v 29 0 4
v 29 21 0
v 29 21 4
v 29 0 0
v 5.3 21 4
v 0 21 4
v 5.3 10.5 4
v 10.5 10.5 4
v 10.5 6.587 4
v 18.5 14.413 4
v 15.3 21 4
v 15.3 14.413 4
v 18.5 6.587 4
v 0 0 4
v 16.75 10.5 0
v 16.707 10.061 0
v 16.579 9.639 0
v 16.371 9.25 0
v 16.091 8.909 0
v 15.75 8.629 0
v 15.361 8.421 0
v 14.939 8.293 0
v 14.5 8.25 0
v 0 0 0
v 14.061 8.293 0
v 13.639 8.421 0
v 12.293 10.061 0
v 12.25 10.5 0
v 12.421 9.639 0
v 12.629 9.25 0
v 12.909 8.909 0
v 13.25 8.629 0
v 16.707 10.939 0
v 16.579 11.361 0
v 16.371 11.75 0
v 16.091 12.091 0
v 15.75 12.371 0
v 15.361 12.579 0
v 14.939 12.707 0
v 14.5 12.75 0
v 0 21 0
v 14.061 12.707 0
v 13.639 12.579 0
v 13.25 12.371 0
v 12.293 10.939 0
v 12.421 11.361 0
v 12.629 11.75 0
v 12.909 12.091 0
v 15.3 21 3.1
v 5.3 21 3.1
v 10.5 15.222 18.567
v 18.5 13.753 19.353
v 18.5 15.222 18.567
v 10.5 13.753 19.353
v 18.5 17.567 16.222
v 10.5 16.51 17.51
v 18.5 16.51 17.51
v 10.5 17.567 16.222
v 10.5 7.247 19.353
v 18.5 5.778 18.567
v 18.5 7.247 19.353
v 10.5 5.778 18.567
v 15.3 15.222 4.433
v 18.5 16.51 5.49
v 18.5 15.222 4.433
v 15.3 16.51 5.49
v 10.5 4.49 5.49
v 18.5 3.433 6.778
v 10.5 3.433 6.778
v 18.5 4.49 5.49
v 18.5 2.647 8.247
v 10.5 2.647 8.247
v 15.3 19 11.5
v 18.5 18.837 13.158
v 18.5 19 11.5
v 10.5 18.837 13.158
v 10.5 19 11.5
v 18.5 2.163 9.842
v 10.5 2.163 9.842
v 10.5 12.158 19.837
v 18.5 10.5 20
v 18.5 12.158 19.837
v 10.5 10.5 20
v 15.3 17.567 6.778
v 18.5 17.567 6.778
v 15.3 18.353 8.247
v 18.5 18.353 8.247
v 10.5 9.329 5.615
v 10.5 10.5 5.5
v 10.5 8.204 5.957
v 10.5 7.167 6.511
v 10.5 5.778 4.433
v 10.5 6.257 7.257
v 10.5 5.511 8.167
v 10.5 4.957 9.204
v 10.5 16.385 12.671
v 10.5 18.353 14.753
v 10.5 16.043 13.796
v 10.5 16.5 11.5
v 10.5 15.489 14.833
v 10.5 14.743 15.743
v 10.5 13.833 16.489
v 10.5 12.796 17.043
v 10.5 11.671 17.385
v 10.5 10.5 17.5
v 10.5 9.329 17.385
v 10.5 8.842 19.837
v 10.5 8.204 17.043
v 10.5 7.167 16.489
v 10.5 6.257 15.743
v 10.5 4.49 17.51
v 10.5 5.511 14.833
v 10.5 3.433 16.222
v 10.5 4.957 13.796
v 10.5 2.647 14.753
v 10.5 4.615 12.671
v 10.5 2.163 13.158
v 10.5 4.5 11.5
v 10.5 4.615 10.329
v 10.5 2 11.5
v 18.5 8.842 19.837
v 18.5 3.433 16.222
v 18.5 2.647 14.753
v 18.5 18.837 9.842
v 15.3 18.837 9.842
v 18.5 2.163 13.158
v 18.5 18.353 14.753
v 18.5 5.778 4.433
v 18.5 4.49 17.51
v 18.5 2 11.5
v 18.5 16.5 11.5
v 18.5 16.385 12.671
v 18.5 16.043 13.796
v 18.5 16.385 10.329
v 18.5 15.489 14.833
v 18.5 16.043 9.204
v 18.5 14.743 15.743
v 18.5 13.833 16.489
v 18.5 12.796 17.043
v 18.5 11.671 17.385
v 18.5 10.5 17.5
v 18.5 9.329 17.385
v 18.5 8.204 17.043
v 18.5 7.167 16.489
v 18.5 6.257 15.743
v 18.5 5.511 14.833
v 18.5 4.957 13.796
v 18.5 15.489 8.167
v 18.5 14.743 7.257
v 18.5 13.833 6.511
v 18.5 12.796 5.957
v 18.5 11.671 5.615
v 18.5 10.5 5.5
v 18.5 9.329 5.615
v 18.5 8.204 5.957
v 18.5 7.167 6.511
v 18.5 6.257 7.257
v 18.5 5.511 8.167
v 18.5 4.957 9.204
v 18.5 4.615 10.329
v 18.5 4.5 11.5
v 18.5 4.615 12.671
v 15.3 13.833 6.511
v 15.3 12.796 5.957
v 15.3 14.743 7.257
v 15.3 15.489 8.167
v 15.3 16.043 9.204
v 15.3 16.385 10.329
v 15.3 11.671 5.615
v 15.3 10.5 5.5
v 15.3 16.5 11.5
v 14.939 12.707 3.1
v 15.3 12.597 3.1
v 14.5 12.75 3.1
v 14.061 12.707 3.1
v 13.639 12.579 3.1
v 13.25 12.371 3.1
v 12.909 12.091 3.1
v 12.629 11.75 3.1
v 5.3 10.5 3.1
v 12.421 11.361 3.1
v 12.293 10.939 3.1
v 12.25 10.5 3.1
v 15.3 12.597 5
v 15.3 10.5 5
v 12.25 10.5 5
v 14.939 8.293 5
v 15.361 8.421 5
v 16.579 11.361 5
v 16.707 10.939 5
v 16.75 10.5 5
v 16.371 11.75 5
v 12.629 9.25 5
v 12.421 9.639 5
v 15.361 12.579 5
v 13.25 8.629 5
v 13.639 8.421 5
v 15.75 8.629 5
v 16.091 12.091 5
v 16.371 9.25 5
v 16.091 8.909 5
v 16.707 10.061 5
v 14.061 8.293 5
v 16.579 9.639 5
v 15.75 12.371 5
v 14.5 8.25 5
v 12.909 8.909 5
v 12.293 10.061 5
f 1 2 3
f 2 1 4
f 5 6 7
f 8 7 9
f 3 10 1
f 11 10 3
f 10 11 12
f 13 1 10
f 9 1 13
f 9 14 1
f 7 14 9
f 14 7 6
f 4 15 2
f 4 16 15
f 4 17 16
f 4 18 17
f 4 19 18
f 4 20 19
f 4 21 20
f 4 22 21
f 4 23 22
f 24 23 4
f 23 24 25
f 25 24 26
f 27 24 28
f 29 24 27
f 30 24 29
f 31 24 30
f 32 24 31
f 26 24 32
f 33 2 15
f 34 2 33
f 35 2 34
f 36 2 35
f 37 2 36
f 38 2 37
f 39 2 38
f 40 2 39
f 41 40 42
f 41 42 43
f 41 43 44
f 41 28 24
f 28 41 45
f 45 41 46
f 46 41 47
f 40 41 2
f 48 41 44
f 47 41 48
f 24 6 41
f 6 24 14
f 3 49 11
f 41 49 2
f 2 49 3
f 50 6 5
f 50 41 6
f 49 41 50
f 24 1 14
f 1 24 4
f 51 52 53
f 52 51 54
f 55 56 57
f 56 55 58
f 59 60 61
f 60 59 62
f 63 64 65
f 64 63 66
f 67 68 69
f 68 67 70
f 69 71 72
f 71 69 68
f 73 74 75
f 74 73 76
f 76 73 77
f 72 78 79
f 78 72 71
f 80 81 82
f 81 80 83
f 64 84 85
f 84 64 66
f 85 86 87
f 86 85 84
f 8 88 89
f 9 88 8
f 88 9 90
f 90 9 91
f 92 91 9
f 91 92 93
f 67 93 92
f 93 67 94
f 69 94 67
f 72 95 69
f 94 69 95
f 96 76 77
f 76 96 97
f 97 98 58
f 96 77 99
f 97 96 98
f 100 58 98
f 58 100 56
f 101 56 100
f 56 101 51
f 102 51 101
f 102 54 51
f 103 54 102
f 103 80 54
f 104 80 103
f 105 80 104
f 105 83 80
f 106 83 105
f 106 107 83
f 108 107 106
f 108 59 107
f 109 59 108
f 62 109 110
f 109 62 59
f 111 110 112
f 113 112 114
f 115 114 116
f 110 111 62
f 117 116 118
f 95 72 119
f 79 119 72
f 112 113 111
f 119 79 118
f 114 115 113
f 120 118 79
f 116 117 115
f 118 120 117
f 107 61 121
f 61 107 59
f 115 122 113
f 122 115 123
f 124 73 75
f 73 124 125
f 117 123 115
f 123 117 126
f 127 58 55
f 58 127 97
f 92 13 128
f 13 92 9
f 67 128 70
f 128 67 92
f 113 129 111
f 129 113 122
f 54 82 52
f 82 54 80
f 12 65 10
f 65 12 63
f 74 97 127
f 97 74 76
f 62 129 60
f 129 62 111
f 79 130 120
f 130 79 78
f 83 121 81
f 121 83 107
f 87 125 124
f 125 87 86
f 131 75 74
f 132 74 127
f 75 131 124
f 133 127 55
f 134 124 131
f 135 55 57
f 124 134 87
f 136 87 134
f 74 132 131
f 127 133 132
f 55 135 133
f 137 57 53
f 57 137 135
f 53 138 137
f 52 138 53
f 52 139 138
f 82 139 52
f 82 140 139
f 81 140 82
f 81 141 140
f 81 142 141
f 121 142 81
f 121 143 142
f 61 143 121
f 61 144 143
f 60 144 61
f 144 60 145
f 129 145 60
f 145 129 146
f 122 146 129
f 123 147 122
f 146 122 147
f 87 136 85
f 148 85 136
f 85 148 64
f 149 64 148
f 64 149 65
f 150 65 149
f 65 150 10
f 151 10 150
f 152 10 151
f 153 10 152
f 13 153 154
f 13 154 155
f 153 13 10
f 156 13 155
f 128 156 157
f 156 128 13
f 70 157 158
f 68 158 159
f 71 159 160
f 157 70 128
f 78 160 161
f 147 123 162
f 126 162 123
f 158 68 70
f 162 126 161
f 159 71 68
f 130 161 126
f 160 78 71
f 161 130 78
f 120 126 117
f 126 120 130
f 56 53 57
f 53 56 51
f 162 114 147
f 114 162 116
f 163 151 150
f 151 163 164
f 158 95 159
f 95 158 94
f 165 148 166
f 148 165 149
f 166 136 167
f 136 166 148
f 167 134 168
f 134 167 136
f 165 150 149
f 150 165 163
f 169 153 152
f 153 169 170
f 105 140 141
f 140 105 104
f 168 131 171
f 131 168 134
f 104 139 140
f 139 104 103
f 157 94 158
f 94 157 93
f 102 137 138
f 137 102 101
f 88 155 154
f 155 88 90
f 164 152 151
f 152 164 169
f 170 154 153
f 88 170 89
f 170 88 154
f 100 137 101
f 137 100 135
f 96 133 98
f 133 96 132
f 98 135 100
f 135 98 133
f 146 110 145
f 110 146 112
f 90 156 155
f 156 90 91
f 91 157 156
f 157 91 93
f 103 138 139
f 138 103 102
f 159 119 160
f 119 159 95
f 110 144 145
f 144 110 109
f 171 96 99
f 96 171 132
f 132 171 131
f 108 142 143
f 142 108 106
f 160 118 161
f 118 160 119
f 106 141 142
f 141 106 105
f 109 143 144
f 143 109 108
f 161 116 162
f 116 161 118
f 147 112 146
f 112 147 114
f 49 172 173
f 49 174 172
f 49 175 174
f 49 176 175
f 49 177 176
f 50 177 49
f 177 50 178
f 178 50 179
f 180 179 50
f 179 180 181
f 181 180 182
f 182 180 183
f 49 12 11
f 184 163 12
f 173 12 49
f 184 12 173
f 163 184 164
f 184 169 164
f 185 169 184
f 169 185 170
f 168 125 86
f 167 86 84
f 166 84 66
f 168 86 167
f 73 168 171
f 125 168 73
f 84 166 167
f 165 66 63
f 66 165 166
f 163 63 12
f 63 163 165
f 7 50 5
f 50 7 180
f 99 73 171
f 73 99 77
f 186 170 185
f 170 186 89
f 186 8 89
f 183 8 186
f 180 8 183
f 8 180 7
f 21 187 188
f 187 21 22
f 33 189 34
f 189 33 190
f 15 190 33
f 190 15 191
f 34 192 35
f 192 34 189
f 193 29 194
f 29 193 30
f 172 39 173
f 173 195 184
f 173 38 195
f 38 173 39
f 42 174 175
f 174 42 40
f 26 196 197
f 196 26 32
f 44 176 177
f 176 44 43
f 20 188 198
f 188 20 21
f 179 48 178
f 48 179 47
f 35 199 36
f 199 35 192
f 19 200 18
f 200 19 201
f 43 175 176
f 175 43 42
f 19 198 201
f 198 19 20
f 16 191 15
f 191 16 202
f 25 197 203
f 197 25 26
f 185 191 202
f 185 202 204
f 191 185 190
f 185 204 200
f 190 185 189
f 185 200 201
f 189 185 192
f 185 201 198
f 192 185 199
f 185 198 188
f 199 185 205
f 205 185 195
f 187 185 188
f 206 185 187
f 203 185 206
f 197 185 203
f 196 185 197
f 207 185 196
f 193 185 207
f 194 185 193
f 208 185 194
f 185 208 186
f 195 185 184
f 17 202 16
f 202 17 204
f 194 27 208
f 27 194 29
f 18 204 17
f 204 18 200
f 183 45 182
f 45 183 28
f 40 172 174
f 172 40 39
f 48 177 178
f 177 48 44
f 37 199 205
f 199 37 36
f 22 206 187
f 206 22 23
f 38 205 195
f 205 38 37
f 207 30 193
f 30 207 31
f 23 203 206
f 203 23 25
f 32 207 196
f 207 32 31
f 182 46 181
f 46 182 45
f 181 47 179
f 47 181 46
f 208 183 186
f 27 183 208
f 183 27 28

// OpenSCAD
$fn = 32;

// ----------------------------------------------------------------------
// Cable clip: cable 12 mm, clamp 17 mm, base 29 mm
// ----------------------------------------------------------------------

// --- parameters (mm) ---
plate_x = 29;             // base length, X
plate_y = 21;             // base width, Y
plate_t = 4;              // base thickness
wire_seat_d = 17;         // clamp outside diameter
clip_t = 2.5;             // clamp wall
cable_d = 12;             // cable opening
ring_w = 8;               // clamp width along the cable
screw_d = 4.5;            // screw clearance
throat = 8.4;             // snap throat width
sink = 1;                 // overlap of the clamp into the base

module base() {
  cube([plate_x, plate_y, plate_t]);
}

module clamp() {
  translate([plate_x / 2, plate_y / 2, plate_t + wire_seat_d / 2 - sink]) rotate([0, 90, 0])
    cylinder(h = ring_w, d = wire_seat_d, center = true);
}

difference() {
  union() {
    base();
    clamp();
  }
  translate([plate_x / 2, plate_y / 2, plate_t + wire_seat_d / 2 - sink]) rotate([0, 90, 0]) translate([0, 0, -ring_w / 2 - 1]) cylinder(h = ring_w + 2, d = cable_d);
  /* snap throat: the opening is narrower than the cable */
  translate([plate_x / 2 - throat / 2, plate_y / 2, plate_t + wire_seat_d / 2 - sink]) rotate([0, 90, 0]) translate([0, 0, -ring_w / 2 - 1]) cube([throat, wire_seat_d + 2, ring_w + 2]);
  translate([14.5, plate_y / 2, -1]) cylinder(h = plate_t + 2, d = screw_d);
}
